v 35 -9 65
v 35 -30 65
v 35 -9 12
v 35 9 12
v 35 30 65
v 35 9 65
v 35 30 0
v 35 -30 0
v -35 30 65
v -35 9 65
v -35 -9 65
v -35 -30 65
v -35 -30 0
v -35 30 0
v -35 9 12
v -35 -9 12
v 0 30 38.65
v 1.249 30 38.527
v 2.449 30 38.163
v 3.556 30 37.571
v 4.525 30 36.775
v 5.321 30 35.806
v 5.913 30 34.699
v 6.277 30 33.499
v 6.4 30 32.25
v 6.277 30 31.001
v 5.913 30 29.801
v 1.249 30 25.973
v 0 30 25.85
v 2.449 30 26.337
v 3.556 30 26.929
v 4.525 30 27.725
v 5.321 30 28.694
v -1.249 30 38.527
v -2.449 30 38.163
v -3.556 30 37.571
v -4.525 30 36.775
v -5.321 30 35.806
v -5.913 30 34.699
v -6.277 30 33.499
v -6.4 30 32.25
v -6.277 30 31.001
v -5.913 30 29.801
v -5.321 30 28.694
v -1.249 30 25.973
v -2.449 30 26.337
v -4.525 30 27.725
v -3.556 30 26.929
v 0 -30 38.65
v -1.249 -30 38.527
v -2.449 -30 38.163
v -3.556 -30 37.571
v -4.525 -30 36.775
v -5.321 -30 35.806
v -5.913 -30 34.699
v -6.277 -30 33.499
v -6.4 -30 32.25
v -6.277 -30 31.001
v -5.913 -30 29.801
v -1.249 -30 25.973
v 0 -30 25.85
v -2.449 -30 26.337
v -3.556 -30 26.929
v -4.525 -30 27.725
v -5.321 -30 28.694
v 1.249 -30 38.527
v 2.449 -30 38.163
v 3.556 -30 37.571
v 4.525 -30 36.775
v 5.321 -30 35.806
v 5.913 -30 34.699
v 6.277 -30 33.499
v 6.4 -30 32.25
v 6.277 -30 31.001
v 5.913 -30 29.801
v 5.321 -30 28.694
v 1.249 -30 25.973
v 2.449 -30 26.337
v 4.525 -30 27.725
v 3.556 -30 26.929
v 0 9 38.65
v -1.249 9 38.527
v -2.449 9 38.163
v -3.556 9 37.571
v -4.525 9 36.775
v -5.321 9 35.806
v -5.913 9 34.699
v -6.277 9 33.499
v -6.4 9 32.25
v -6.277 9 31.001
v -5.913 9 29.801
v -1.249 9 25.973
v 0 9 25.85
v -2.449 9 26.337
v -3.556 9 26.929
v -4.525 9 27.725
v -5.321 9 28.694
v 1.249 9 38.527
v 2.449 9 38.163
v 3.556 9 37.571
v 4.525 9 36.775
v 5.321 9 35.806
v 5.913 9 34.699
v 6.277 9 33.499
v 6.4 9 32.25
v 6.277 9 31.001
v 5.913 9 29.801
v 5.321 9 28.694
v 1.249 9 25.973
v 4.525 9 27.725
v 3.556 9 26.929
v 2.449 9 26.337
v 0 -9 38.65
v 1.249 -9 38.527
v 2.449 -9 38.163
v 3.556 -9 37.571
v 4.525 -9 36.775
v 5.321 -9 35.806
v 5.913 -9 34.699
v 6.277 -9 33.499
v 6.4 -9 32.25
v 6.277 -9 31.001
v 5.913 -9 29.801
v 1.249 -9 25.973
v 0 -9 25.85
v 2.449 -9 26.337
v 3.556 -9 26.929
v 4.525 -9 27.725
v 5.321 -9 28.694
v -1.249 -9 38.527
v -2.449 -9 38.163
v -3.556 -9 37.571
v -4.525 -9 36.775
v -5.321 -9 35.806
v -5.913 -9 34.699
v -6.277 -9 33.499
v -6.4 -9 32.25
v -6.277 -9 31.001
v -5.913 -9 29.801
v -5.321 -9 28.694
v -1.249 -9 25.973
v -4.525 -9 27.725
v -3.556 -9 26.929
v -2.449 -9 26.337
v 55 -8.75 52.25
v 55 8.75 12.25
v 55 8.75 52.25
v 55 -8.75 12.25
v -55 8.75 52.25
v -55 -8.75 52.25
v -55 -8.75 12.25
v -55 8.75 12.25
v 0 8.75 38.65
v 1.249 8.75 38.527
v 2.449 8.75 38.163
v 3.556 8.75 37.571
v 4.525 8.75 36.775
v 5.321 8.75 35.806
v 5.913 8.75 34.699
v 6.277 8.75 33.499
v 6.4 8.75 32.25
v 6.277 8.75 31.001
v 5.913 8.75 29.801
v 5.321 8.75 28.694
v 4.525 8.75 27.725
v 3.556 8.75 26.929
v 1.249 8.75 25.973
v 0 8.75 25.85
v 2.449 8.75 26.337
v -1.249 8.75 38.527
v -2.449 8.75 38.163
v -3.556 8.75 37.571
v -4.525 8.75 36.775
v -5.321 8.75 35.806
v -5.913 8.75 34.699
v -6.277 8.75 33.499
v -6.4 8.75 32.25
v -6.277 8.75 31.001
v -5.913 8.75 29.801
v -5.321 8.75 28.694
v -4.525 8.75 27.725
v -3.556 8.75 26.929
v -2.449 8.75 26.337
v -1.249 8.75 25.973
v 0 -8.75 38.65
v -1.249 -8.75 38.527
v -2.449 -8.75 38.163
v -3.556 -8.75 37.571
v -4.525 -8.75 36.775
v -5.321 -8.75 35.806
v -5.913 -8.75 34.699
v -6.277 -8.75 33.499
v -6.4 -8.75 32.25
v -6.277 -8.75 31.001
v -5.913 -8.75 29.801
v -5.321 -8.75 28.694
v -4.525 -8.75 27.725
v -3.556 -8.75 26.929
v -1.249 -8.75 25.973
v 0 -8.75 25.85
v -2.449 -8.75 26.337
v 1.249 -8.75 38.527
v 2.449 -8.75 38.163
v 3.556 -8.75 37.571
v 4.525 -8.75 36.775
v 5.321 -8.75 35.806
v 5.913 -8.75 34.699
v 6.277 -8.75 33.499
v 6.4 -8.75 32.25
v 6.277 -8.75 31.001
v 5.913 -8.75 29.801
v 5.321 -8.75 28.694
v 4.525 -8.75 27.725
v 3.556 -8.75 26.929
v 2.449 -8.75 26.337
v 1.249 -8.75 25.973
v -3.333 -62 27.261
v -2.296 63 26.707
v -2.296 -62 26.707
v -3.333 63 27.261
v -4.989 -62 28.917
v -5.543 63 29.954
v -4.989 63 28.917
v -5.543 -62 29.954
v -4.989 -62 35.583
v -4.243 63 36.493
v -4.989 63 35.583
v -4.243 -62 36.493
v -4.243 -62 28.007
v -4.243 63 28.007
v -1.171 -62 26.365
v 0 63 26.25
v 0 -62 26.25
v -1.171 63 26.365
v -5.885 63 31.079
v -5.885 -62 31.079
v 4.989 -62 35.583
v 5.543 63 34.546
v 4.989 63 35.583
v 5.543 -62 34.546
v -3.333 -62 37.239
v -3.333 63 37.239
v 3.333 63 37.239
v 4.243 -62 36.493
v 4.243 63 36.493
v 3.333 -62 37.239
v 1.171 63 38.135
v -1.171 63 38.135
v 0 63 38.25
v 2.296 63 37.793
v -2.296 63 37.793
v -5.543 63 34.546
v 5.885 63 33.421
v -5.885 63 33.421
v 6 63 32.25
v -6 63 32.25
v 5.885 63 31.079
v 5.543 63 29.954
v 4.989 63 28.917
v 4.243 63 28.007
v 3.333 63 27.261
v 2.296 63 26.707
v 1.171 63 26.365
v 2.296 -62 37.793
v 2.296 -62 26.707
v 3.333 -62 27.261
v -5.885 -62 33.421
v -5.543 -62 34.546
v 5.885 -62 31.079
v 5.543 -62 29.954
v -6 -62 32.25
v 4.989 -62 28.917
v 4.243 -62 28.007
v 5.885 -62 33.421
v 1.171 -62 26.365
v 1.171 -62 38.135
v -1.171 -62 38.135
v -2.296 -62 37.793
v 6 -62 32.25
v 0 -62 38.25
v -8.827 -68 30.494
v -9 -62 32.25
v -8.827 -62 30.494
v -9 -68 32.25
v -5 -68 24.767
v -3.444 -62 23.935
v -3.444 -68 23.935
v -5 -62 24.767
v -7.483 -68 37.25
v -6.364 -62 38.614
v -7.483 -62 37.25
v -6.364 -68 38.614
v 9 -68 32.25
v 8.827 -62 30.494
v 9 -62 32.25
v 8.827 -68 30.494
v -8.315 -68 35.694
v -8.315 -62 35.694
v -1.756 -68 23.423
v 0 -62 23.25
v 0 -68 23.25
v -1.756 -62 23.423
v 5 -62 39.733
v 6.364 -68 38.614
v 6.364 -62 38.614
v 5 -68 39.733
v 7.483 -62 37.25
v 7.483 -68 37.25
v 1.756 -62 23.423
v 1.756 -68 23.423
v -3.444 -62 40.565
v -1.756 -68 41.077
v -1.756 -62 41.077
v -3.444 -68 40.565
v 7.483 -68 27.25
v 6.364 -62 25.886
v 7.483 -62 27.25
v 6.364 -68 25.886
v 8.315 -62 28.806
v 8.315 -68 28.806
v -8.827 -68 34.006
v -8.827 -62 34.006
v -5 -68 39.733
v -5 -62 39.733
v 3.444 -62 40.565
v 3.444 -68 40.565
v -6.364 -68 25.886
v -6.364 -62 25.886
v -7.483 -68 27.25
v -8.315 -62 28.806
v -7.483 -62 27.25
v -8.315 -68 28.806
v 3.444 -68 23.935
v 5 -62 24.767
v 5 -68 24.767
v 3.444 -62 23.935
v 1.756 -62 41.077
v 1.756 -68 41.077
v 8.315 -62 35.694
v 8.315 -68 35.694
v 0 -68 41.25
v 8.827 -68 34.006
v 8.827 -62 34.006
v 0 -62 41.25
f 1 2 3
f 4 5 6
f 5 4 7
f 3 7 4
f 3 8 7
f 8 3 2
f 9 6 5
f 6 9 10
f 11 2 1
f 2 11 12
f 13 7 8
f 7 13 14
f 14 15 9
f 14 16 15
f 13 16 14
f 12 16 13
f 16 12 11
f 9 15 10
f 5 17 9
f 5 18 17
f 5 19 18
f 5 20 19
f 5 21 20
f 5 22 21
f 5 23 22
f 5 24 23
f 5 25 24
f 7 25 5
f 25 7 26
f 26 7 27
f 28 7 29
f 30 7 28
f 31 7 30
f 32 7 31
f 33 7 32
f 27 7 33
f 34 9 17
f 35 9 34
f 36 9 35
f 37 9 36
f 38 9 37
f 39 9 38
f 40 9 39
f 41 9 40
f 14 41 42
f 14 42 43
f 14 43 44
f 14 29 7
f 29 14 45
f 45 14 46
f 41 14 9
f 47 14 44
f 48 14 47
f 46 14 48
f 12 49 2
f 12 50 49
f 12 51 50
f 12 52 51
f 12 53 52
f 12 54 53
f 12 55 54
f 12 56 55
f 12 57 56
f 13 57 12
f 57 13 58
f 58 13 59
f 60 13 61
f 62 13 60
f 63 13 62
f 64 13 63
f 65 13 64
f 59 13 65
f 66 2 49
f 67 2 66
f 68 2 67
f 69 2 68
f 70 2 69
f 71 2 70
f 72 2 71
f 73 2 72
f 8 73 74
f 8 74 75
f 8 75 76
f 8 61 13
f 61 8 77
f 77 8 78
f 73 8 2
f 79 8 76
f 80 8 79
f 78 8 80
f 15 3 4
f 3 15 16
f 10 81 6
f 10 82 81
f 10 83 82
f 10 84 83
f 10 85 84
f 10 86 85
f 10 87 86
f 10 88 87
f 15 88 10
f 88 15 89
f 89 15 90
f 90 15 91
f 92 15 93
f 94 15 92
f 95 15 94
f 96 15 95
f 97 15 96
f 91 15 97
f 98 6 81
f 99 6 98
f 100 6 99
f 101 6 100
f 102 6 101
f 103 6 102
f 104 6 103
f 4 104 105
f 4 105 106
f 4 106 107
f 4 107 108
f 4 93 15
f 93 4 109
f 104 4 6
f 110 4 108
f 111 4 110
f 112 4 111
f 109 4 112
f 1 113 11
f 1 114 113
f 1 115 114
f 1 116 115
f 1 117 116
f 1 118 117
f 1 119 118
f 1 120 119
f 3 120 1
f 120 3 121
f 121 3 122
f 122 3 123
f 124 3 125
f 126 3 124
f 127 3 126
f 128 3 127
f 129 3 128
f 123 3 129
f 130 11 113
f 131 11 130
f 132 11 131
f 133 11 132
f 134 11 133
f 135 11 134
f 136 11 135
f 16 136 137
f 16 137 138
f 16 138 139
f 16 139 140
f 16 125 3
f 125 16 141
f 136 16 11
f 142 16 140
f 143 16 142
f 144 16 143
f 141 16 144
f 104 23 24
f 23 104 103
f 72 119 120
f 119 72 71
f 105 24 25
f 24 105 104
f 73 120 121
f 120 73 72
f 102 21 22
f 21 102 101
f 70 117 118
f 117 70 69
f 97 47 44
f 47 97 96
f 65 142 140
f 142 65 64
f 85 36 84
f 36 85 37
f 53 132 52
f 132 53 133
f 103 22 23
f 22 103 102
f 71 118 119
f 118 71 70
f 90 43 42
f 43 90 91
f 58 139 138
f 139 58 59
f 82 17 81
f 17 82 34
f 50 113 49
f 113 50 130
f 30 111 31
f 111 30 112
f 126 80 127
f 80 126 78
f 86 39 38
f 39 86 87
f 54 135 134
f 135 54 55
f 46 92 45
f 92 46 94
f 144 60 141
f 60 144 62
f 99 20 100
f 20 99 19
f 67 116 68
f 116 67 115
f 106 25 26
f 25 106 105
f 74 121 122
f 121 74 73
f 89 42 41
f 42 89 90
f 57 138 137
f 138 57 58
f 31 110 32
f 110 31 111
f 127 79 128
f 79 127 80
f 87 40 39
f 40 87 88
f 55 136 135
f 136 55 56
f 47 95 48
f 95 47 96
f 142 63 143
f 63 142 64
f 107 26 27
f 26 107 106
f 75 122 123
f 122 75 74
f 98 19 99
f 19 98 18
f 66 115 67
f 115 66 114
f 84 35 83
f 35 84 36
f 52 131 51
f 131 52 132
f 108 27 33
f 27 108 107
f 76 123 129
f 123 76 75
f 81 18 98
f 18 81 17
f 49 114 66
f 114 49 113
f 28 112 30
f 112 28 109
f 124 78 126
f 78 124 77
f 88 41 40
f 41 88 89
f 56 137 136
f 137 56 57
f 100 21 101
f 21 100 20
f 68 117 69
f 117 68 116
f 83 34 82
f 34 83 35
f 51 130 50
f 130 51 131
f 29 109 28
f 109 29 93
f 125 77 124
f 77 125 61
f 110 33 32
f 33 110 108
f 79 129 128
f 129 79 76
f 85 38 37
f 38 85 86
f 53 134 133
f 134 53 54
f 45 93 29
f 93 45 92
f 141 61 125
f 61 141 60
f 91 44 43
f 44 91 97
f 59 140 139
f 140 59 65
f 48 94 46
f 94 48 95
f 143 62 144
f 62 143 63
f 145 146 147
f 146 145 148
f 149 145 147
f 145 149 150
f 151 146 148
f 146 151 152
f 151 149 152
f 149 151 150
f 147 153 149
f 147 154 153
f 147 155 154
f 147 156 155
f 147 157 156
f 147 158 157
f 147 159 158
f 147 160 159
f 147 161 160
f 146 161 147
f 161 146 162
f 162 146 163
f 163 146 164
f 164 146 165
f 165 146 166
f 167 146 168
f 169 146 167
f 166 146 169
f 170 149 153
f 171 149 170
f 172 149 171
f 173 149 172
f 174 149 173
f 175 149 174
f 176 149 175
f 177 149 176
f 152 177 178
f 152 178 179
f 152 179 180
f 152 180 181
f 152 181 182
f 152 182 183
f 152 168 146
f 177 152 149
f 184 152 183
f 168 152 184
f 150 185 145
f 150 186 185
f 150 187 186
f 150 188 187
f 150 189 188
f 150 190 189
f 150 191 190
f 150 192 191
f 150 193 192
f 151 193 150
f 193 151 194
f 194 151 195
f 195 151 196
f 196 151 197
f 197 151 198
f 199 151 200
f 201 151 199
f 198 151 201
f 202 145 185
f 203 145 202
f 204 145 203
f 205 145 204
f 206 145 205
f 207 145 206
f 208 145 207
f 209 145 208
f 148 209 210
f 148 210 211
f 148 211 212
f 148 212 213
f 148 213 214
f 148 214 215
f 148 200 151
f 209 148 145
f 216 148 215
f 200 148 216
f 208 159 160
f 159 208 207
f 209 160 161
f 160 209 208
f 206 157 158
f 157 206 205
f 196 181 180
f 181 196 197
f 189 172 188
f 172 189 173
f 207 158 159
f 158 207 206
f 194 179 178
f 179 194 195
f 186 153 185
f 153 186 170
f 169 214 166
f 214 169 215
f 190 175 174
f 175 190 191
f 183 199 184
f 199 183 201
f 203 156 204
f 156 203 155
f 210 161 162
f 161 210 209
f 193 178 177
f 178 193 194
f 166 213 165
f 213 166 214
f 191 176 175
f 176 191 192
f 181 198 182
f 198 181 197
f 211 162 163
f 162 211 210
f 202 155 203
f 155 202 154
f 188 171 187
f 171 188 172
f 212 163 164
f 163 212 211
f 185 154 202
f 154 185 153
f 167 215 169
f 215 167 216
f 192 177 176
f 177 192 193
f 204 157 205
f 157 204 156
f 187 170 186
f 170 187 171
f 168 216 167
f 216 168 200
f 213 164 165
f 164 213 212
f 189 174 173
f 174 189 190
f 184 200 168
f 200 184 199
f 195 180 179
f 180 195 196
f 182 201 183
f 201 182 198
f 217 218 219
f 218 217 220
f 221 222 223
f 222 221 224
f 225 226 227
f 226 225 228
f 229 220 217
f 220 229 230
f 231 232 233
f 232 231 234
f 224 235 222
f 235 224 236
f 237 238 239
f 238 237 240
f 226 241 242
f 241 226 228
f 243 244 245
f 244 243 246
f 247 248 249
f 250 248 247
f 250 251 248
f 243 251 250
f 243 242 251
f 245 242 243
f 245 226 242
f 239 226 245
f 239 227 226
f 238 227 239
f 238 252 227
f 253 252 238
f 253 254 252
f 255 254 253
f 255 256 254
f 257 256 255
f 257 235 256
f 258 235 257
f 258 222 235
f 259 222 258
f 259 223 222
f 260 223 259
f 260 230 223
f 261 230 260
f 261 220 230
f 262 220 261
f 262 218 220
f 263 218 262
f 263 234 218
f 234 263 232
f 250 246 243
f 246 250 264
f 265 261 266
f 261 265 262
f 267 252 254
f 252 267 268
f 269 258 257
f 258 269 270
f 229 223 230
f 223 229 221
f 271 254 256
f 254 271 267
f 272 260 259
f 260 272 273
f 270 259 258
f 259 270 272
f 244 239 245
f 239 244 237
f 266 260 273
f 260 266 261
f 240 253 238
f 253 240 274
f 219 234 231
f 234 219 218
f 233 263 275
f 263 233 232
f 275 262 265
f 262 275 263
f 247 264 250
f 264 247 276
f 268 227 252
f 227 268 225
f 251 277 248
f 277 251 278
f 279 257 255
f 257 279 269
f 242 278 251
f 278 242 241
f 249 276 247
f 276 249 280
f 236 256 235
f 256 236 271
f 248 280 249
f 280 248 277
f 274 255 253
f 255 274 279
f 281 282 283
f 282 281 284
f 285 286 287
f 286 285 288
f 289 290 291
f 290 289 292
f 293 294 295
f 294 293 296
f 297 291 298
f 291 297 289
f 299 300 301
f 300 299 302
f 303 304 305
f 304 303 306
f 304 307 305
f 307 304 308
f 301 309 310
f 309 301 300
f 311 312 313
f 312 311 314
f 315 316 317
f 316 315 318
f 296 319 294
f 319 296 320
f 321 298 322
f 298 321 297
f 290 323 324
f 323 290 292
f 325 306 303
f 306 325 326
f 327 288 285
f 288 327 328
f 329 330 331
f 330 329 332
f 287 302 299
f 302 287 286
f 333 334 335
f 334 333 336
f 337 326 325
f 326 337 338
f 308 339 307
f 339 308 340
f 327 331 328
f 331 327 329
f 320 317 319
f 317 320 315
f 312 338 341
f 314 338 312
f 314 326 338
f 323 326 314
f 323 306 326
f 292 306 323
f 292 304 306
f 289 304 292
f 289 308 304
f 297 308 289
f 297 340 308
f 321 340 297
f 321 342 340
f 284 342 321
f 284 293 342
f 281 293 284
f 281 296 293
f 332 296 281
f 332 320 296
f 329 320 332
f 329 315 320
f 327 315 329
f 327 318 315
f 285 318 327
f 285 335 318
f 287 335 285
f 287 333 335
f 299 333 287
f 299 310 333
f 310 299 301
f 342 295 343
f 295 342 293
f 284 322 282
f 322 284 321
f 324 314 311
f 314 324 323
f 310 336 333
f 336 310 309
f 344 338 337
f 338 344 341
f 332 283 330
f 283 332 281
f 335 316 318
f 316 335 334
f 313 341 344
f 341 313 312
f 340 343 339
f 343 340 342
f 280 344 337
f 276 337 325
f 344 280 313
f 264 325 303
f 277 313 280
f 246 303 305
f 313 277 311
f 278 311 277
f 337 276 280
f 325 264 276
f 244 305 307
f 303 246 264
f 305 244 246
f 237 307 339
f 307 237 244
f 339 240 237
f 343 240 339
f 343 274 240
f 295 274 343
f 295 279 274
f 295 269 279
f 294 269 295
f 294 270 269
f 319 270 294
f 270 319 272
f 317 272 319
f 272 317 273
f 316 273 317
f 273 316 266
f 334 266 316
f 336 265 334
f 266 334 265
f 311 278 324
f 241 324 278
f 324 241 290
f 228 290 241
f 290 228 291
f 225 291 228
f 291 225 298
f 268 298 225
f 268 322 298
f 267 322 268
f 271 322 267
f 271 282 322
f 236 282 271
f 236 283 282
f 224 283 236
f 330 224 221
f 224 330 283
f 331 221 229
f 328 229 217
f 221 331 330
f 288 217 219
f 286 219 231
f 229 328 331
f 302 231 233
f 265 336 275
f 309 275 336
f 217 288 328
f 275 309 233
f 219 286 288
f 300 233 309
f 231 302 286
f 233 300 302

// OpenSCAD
$fn = 32;

// ------------------------------------------------------------------------
// Clevis joint: 70 mm clevis, pin d12
// Every part is its own module, assembly() places them once.
// ------------------------------------------------------------------------

// --- part 1 ---
module clevis() {
  difference() {
    translate([-35, -30, 0]) cube([70, 60, 65]);
    translate([-36, -9, 12]) cube([72, 18, 54]);
    translate([0, 0, 32.25]) rotate([90, 0, 0]) cylinder(h = 62, d = 12.8, center = true);
  }
}

// --- part 2 ---
module eye() {
  difference() {
    translate([-55, -8.75, 0]) cube([110, 17.5, 40]);
    translate([0, 0, 20]) rotate([90, 0, 0]) cylinder(h = 19.5, d = 12.8, center = true);
  }
}

// --- part 3 ---
module pin() {
  rotate([0, 90, 0]) cylinder(h = 126, d = 12, center = true);
  translate([-68, 0, 0]) rotate([0, 90, 0]) cylinder(h = 6, d = 18);
}

// --- assembly ---
module assembly() {
  translate([0, 0, 0]) rotate([0, 0, 0]) clevis();
  translate([0, 0, 12.25]) rotate([0, 0, 0]) eye();
  translate([0, 0, 32.25]) rotate([0, 0, 90]) pin();
}

assembly();
